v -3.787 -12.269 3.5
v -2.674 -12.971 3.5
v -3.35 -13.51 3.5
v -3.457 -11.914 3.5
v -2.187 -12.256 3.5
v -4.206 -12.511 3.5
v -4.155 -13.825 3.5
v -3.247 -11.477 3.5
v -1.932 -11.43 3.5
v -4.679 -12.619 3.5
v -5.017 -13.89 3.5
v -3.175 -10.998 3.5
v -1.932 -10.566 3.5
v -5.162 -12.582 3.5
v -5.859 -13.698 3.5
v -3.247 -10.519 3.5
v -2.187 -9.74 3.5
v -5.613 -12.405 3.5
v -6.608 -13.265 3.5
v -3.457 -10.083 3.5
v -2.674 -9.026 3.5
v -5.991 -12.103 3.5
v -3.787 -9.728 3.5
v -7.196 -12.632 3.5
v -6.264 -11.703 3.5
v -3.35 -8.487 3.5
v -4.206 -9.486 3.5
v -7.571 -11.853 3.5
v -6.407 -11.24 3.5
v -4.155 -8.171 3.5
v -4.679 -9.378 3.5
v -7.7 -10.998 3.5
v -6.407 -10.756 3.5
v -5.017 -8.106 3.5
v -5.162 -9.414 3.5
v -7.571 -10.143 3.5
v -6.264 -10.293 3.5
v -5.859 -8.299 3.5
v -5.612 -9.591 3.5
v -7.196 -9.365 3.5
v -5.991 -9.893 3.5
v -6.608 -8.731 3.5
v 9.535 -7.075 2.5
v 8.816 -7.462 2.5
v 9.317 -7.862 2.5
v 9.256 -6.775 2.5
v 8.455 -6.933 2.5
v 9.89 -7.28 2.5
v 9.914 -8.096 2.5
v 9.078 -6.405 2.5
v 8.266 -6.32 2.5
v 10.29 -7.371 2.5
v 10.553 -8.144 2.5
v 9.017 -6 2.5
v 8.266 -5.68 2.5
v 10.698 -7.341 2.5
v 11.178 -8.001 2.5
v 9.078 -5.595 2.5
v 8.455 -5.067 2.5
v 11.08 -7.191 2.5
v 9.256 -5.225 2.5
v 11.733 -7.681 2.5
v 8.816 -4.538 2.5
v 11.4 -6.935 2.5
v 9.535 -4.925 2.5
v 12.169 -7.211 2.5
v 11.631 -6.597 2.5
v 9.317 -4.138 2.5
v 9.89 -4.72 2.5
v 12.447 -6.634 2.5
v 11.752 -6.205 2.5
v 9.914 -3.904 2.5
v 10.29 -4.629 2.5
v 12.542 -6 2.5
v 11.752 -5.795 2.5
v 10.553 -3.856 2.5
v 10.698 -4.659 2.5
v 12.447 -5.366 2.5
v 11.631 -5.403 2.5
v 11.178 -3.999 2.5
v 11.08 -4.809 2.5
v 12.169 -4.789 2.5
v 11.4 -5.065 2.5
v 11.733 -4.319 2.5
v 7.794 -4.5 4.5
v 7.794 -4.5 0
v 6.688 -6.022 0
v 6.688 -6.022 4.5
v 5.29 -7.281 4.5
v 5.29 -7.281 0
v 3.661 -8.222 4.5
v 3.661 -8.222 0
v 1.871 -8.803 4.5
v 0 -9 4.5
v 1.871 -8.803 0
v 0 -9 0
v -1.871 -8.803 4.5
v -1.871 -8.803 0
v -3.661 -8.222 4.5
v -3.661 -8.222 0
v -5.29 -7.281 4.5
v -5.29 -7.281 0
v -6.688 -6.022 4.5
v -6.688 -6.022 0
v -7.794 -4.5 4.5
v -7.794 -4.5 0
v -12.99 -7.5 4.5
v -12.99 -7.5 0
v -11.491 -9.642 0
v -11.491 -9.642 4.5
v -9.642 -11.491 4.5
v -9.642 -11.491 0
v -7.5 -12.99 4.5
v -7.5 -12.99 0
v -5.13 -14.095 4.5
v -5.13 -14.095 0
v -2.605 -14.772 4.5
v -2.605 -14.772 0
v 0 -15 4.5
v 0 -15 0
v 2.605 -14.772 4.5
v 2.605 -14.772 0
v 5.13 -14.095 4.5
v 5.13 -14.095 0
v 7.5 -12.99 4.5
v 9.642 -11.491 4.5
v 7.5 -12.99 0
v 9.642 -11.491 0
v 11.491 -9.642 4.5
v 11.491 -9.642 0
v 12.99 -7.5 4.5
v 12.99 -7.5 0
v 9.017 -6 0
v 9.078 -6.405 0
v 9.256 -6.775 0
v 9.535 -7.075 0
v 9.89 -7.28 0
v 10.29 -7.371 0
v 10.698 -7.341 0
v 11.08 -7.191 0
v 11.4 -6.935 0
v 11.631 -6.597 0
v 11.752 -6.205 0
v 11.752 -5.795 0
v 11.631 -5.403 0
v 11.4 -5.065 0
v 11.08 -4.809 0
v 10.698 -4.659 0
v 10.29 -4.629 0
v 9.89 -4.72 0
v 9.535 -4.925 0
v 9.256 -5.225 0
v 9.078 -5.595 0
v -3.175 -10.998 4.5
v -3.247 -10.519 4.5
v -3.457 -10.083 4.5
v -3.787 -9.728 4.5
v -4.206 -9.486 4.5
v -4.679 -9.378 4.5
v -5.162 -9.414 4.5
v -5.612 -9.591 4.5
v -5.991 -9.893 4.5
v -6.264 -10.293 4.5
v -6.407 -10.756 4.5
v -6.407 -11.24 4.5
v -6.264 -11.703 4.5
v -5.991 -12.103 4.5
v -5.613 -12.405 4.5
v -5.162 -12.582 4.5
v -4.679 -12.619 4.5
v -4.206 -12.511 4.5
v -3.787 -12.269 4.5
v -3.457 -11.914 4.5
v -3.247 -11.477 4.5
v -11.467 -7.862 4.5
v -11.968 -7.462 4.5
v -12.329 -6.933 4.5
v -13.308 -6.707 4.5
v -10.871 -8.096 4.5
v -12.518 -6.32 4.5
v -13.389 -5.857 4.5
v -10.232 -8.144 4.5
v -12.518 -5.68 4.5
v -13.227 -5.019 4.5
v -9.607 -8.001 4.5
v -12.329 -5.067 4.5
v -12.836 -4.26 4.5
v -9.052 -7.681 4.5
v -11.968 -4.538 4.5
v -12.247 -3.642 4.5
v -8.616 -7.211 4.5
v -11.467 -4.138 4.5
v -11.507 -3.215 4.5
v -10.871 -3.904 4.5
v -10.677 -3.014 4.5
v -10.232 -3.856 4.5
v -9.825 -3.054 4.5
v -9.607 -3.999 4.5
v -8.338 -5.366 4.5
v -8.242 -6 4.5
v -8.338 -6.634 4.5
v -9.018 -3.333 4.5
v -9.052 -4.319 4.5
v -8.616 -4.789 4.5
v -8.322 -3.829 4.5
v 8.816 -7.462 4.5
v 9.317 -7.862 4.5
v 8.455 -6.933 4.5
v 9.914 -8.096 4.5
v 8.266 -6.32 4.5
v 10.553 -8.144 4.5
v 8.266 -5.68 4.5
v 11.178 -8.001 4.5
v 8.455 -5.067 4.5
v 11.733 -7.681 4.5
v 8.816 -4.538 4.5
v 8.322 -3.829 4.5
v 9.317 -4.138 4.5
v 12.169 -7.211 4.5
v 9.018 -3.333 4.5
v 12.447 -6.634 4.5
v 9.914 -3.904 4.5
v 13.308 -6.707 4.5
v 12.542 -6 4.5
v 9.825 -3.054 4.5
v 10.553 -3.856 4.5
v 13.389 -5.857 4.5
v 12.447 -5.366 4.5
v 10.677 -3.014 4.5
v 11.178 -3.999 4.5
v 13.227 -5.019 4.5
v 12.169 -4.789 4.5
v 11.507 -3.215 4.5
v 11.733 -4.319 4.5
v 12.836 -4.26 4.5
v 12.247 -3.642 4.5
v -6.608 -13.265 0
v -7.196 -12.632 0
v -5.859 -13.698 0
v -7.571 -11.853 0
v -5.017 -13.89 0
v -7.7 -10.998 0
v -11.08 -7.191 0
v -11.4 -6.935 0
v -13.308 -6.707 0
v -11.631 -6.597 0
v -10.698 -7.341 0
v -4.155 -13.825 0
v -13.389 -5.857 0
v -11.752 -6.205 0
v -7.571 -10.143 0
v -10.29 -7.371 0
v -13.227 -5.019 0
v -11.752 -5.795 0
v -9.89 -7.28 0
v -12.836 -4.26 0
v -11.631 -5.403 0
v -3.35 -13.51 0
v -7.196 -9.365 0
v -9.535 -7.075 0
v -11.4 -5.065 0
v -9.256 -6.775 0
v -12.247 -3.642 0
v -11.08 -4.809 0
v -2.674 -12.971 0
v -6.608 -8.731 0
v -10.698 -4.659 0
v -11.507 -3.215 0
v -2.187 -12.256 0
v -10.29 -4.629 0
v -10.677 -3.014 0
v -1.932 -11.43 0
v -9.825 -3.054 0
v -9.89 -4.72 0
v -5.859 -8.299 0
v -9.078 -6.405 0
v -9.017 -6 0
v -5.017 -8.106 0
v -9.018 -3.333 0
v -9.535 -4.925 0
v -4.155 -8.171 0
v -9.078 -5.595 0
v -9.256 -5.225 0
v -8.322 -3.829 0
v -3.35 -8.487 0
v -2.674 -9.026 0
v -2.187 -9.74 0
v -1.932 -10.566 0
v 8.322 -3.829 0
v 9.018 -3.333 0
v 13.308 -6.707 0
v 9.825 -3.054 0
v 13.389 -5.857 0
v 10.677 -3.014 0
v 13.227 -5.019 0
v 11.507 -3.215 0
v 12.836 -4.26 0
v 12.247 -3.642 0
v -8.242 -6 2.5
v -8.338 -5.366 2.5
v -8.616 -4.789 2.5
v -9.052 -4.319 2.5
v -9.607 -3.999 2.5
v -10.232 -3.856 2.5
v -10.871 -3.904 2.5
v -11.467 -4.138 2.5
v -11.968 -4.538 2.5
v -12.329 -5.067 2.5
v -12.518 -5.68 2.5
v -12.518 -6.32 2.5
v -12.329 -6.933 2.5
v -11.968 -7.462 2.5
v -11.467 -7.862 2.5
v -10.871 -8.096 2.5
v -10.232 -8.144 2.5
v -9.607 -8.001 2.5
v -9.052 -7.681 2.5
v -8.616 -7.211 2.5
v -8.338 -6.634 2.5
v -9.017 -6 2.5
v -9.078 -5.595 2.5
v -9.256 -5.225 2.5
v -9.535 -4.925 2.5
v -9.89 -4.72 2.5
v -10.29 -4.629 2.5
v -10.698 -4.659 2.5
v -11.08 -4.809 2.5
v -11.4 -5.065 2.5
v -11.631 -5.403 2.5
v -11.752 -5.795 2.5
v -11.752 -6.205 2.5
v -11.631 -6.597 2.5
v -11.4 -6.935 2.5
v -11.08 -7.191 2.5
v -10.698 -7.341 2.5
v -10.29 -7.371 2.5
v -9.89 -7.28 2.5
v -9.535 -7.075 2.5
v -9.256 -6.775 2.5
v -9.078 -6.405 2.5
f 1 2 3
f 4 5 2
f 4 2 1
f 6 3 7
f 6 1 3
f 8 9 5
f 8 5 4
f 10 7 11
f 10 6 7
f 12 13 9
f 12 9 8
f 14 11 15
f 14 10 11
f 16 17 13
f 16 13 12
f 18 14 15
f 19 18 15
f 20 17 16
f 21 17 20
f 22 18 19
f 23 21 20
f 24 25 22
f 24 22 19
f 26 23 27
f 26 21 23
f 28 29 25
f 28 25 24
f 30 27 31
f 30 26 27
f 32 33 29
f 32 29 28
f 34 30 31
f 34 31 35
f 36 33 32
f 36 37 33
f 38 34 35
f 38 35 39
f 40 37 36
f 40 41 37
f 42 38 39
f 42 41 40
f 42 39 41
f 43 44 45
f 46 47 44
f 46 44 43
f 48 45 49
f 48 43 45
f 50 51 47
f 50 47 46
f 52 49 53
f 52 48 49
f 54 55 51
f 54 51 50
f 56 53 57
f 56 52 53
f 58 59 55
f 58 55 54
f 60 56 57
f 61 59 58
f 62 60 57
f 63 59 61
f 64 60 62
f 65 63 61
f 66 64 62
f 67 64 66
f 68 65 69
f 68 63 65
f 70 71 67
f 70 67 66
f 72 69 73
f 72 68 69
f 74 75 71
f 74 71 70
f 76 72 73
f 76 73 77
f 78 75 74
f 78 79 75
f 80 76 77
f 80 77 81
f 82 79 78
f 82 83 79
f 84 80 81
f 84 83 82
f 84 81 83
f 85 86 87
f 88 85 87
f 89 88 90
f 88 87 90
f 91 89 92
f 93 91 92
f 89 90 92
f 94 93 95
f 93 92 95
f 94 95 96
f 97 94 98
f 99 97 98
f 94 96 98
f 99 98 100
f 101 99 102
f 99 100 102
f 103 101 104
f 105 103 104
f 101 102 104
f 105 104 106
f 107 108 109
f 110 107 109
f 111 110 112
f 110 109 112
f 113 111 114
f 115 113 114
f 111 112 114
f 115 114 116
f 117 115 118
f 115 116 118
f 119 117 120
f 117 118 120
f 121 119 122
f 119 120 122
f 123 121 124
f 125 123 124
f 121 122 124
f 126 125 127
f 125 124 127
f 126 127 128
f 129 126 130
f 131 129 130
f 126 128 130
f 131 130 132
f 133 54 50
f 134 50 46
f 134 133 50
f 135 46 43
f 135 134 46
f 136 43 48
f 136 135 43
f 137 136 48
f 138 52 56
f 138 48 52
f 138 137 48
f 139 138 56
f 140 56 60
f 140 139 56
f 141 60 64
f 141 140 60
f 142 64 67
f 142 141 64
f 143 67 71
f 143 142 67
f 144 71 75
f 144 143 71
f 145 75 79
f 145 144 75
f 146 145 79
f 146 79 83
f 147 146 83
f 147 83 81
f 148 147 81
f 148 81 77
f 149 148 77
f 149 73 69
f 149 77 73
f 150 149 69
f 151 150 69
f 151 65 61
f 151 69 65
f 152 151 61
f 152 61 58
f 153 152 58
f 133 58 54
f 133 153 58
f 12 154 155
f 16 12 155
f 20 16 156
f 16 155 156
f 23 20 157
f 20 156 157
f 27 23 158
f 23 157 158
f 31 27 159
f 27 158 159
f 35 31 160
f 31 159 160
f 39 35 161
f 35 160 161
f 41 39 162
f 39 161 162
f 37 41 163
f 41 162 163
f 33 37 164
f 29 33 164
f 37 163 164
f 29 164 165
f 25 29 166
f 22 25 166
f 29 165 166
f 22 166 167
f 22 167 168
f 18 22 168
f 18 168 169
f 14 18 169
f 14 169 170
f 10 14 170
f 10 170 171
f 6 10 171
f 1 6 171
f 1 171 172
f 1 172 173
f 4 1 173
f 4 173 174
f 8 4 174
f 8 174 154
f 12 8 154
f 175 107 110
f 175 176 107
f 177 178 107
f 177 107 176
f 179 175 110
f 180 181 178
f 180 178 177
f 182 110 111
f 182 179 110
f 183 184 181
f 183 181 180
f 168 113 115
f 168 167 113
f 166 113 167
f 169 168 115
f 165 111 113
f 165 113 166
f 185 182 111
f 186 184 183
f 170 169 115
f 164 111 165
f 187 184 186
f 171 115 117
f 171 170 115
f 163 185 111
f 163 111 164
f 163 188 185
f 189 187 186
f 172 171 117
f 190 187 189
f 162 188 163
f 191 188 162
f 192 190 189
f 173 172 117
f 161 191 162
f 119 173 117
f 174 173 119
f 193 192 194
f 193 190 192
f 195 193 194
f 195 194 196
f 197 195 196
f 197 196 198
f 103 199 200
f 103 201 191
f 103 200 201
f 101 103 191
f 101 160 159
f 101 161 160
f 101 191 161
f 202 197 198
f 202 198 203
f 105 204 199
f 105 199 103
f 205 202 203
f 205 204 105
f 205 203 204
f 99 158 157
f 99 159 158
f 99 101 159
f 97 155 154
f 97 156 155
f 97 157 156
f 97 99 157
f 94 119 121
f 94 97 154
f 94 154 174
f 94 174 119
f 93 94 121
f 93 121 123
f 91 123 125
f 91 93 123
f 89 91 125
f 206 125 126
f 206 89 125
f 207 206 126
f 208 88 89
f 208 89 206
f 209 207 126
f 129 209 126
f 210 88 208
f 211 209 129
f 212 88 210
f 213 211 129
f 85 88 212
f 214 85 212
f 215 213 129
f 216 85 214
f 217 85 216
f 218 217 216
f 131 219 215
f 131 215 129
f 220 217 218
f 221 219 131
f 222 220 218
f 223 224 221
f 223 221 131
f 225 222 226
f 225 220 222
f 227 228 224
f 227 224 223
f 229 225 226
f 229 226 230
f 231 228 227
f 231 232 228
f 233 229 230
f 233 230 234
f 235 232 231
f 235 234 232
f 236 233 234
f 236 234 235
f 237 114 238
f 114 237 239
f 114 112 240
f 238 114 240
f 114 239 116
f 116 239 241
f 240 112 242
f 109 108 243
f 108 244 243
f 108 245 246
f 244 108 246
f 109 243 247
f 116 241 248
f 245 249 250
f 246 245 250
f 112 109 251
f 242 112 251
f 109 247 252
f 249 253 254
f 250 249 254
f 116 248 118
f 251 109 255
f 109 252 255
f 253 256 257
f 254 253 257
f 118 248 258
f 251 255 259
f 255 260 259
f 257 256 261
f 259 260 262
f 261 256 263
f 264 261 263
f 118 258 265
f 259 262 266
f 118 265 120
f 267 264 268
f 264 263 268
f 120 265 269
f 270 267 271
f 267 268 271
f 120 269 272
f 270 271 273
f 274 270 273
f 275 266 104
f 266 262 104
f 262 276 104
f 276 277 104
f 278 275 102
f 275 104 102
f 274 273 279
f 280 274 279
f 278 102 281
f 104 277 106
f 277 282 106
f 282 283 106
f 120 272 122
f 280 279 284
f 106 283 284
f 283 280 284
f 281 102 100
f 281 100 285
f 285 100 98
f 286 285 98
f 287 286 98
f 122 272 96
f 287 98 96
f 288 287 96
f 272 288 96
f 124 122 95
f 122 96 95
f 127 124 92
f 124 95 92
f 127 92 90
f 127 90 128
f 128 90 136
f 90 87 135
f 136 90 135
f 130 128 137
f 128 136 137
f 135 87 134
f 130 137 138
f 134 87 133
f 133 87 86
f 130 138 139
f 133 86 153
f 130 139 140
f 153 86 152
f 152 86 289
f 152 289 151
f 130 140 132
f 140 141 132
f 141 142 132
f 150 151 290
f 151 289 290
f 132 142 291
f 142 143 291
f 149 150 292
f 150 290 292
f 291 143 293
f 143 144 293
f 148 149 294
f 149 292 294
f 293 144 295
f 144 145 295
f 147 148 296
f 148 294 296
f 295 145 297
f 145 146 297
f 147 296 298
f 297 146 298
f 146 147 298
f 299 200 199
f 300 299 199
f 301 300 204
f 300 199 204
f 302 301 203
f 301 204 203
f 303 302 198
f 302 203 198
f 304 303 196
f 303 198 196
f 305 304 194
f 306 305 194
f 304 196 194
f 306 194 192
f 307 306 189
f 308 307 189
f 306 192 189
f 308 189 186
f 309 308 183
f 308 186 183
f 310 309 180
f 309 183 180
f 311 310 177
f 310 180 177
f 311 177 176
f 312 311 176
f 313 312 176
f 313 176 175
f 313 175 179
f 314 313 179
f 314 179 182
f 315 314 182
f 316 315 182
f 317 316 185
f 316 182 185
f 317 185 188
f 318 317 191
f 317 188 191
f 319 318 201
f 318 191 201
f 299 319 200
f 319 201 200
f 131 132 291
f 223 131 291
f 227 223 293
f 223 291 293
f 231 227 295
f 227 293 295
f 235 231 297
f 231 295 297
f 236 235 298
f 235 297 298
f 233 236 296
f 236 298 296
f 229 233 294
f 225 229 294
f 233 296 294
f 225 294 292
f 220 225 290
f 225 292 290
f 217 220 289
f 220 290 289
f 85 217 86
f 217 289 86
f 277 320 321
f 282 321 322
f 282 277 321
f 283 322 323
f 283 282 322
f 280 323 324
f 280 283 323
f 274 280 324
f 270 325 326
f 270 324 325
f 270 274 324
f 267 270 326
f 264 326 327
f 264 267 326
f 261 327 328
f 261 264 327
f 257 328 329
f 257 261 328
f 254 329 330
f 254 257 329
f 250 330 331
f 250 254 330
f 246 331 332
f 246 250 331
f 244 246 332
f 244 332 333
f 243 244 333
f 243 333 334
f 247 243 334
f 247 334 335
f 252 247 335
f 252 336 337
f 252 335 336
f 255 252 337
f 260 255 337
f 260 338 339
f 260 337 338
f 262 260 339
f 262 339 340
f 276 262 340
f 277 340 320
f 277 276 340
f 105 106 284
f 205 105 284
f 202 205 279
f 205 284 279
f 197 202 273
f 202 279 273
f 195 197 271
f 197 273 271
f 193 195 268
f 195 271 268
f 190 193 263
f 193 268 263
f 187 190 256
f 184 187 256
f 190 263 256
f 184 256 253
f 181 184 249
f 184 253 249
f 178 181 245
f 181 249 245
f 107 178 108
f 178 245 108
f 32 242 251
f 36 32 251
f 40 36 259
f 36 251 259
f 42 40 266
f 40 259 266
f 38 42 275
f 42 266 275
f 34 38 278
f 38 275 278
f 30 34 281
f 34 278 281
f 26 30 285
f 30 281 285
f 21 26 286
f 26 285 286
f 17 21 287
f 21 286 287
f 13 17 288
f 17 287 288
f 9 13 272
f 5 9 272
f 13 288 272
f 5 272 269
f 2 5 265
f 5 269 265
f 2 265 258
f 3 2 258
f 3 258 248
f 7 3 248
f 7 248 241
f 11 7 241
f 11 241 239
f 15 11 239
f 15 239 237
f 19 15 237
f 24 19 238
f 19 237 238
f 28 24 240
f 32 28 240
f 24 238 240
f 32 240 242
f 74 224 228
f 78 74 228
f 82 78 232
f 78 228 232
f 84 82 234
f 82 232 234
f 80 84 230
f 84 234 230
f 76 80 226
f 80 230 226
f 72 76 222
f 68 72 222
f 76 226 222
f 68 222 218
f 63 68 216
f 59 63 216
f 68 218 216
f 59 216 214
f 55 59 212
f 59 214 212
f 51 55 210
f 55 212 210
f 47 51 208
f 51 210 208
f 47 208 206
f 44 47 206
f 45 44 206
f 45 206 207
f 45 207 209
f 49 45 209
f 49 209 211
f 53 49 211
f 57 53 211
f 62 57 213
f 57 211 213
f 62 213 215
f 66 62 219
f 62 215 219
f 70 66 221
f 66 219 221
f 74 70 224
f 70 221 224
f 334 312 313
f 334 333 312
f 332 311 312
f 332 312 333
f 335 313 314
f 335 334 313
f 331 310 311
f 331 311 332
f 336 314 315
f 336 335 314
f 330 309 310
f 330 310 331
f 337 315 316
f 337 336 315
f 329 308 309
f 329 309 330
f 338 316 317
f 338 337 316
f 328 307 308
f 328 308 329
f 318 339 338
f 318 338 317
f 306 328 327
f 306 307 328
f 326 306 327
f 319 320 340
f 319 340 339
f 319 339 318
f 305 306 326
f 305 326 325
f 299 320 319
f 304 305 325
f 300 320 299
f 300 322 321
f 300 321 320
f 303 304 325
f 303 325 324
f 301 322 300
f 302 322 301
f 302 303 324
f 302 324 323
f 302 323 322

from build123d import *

# Parameters (mm, degrees)
ESBO_O1_R                = 1.375
RESSALTO_EXTRUS_O3_DEPTH = 4.5
ESBO_O7_R                = 1.625
CORTE_EXTRUS_O4_DEPTH    = 21.605917331
ESBO_O8_R                = 2.15
CORTE_EXTRUS_O5_DEPTH    = 2
ESBO_O9_R                = 2.9
CORTE_EXTRUS_O6_DEPTH    = 3.5


with BuildPart() as part:
    # Esboço1 → Ressalto-extrusão3 (new body)
    with BuildSketch(Plane.XY):
        with BuildLine():
            ThreePointArc((-7.794228634, -4.5), (-11.892304845, -3.401923789), (-12.990381057, -7.5))
            ThreePointArc((-12.990381057, -7.5), (0, -15), (12.990381057, -7.5))
            ThreePointArc((12.990381057, -7.5), (11.892304845, -3.401923789), (7.794228634, -4.5))
            ThreePointArc((7.794228634, -4.5), (0, -9), (-7.794228634, -4.5))
        make_face()
        with Locations((-10.392304845, -6)):
            Circle(ESBO_O1_R, mode=Mode.SUBTRACT)
        with Locations(Location((10.392304845, -6, 0), (0, 0, 180))):
            Circle(ESBO_O1_R, mode=Mode.SUBTRACT)
    extrude(amount=RESSALTO_EXTRUS_O3_DEPTH)

    # Esboço7 → Corte-extrusão4 (cut, through all)
    with BuildSketch(Plane.XY.offset(4.5)):
        with Locations((-4.8, -10.998181668)):
            Circle(ESBO_O7_R)
    extrude(amount=-CORTE_EXTRUS_O4_DEPTH, mode=Mode.SUBTRACT)

    # Esboço8 → Corte-extrusão5 (cut)
    with BuildSketch(Plane.XY.offset(4.5)):
        with Locations((-10.392304845, -6)):
            Circle(ESBO_O8_R)
        with Locations((10.392304845, -6)):
            Circle(ESBO_O8_R)
    extrude(amount=-CORTE_EXTRUS_O5_DEPTH, mode=Mode.SUBTRACT)

    # Esboço9 → Corte-extrusão6 (cut)
    with BuildSketch(Plane(origin=(0, 0, 0), x_dir=(-1, 0, 0), z_dir=(0, 0, -1))):
        with Locations((4.8, -10.998181668)):
            Circle(ESBO_O9_R)
    extrude(amount=-CORTE_EXTRUS_O6_DEPTH, mode=Mode.SUBTRACT)


solid = part.part
